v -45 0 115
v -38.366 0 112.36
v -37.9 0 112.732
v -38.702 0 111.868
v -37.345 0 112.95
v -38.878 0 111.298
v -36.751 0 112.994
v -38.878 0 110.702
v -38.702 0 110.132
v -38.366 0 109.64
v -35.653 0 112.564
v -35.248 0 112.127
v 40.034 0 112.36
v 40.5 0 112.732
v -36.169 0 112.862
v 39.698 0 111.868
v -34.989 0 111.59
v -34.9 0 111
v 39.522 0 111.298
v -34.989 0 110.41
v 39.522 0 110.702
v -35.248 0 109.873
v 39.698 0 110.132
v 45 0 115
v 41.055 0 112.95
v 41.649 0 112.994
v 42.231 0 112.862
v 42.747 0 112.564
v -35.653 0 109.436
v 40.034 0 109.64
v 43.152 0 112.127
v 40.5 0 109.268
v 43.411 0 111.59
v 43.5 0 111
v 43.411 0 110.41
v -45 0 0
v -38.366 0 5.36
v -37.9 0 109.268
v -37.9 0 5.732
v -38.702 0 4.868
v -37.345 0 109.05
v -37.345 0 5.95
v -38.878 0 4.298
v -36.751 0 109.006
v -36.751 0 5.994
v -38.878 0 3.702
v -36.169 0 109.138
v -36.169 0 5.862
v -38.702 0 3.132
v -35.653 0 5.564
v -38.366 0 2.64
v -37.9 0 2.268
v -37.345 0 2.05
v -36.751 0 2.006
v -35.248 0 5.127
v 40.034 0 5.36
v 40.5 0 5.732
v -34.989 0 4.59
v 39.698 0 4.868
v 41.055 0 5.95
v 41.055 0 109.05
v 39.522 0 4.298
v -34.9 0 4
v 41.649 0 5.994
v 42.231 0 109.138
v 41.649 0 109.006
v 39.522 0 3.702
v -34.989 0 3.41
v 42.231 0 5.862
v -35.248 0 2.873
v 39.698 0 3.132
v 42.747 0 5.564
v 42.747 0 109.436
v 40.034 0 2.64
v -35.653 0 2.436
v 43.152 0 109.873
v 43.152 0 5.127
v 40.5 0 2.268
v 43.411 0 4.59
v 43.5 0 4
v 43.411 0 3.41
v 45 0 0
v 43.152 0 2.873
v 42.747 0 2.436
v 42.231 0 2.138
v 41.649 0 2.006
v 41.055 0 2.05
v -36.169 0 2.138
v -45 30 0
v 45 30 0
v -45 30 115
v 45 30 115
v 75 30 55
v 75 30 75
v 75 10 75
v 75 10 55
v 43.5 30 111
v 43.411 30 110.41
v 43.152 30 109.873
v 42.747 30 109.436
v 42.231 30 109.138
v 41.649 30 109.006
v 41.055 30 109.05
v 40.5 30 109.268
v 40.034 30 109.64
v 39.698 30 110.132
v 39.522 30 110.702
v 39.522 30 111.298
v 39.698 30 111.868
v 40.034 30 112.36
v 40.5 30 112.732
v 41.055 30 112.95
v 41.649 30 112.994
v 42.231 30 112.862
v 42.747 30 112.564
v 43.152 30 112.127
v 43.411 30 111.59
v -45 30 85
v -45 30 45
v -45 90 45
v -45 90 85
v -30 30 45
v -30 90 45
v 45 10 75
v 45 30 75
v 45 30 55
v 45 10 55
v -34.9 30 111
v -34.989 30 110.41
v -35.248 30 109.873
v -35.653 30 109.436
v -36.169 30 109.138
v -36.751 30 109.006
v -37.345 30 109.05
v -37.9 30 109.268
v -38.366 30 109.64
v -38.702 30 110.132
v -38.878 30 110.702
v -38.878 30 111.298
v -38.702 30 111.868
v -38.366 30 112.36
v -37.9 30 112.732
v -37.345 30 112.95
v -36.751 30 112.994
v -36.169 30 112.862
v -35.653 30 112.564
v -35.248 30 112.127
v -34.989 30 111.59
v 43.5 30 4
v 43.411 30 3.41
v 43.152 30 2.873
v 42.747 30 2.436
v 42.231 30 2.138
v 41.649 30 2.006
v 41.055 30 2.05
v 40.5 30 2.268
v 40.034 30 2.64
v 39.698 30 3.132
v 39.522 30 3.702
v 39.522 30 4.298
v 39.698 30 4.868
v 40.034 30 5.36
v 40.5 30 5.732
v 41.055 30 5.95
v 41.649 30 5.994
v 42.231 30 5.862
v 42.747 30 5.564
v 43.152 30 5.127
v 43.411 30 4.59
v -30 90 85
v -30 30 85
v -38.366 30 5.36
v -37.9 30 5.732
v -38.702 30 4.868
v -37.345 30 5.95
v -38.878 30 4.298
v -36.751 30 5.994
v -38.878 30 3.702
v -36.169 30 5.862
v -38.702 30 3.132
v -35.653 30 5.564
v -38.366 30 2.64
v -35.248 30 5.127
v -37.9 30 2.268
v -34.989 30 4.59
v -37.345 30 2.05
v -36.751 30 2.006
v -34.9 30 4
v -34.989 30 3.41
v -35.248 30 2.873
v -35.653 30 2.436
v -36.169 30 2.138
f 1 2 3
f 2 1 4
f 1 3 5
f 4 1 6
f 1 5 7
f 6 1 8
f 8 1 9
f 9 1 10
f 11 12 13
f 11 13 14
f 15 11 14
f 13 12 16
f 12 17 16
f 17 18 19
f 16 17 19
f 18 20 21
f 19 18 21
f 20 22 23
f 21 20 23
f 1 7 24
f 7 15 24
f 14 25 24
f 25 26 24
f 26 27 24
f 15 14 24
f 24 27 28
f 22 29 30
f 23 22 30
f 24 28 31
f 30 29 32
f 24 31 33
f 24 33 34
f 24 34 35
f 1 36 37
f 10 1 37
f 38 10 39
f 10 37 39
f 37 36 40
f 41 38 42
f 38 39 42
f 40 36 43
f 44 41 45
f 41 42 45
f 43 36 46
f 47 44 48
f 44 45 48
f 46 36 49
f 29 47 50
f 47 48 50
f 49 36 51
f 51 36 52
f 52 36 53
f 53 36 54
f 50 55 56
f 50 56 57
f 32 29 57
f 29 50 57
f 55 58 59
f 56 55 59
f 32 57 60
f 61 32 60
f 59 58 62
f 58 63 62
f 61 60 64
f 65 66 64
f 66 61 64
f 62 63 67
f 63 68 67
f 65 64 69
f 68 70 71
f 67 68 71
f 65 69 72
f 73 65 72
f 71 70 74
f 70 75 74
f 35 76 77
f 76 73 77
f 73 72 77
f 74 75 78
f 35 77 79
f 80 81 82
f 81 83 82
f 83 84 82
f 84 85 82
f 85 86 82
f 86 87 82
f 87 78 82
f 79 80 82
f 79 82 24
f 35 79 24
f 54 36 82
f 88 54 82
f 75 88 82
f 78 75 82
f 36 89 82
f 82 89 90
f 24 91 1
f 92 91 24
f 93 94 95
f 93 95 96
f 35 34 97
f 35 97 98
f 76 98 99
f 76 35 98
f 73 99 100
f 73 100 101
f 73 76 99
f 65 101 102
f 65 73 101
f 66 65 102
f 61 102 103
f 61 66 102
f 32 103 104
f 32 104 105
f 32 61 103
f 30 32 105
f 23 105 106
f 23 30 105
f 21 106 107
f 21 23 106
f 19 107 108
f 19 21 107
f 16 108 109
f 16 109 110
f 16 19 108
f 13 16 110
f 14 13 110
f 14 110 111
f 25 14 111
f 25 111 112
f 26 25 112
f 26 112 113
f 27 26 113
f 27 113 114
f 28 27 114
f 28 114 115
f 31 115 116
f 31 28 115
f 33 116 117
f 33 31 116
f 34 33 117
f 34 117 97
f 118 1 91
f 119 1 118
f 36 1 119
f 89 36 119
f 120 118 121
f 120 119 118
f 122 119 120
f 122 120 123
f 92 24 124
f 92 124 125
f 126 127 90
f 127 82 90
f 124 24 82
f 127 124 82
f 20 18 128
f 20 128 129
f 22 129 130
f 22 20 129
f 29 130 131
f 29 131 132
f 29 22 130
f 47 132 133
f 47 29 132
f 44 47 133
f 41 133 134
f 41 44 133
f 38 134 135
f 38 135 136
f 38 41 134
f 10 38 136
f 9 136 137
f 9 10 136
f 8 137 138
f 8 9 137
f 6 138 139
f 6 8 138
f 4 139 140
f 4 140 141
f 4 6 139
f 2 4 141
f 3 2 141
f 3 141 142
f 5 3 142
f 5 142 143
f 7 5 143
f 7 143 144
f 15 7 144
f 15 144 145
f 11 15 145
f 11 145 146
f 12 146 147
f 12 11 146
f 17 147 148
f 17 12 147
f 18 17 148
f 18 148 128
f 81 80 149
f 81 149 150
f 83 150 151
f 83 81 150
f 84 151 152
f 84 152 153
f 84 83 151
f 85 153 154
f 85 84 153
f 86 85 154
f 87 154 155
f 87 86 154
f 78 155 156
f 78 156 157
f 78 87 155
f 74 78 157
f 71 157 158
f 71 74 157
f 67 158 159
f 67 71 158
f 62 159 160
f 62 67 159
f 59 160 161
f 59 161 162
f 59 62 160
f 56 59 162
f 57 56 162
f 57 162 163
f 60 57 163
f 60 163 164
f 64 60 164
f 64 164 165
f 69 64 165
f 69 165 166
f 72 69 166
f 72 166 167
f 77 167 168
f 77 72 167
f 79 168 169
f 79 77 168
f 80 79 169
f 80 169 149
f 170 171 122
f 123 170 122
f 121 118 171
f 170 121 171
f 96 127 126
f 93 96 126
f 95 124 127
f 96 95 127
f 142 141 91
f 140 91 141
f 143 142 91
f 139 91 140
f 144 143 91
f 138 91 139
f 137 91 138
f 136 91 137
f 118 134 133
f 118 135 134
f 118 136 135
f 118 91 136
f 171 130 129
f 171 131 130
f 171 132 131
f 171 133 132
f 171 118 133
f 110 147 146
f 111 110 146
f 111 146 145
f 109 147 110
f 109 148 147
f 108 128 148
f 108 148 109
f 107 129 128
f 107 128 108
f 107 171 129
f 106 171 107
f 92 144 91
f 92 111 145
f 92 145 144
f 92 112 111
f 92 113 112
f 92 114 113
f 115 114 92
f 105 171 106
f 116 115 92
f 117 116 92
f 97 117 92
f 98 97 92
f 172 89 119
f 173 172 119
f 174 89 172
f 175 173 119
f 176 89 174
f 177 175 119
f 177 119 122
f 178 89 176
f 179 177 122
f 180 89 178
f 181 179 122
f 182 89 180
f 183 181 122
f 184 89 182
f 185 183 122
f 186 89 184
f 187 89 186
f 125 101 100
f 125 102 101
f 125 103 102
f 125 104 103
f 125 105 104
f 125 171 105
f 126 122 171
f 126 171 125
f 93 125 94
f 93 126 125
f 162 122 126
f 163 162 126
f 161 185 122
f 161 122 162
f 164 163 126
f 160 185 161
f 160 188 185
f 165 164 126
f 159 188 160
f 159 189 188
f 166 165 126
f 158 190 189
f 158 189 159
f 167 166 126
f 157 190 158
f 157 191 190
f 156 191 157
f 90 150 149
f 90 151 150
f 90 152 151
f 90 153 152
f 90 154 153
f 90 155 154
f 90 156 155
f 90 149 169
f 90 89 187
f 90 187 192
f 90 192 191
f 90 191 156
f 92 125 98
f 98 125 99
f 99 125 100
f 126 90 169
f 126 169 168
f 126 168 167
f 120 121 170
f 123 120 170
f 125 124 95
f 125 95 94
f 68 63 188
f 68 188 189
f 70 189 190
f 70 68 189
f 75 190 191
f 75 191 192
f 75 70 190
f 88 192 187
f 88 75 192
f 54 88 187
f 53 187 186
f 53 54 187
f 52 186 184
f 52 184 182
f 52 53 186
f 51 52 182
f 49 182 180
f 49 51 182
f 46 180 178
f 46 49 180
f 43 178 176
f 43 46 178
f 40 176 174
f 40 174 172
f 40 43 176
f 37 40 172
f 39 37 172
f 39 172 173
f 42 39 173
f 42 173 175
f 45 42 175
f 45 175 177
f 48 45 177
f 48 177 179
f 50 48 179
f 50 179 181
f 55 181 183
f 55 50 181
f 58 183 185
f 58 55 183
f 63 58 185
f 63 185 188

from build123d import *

# Parameters (mm, degrees)
SKETCH_1_W              = 90
SKETCH_1_H              = 30
EXTRUDE_1_DEPTH         = 115
SKETCH_3_W              = 20
SKETCH_3_H              = 20
EXTRUDE_2_DEPTH         = 30
SKETCH_4_W              = 15
SKETCH_4_H              = 40
EXTRUDE_3_DEPTH         = 60
CUT_EXTRUDE_1_OUTLINE_R = 2
CUT_EXTRUDE_1_DEPTH     = 30


# Read off the part's stored shape, not the designer's step: 切除-拉伸1
with BuildPart() as part:
    # 草图1 → 凸台-拉伸1 (new body)
    with BuildSketch(Plane.XY):
        with Locations((0, 15)):
            Rectangle(SKETCH_1_W, SKETCH_1_H)
    extrude(amount=EXTRUDE_1_DEPTH)

    # 草图3 → 凸台-拉伸2 (add)
    with BuildSketch(Plane(origin=(45, 0, 0), x_dir=(0, 0, -1), z_dir=(1, 0, 0))):
        with Locations((-65, 20)):
            Rectangle(SKETCH_3_W, SKETCH_3_H)
    extrude(amount=EXTRUDE_2_DEPTH)

    # 草图4 → 凸台-拉伸3 (add)
    with BuildSketch(Plane(origin=(0, 30, 0), x_dir=(1, 0, 0), z_dir=(0, 1, 0))):
        with Locations((-37.5, -65)):
            Rectangle(SKETCH_4_W, SKETCH_4_H)
    extrude(amount=EXTRUDE_3_DEPTH)

    # 切除-拉伸1 outline → 切除-拉伸1 (cut)
    with BuildSketch(Plane(origin=(0, 0, 0), x_dir=(1, 0, 0), z_dir=(0, 1, 0))):
        with Locations((41.5, -4)):
            Circle(CUT_EXTRUDE_1_OUTLINE_R)
        with Locations((-36.9, -4)):
            Circle(CUT_EXTRUDE_1_OUTLINE_R)
        with Locations((-36.9, -111)):
            Circle(CUT_EXTRUDE_1_OUTLINE_R)
        with Locations((41.5, -111)):
            Circle(CUT_EXTRUDE_1_OUTLINE_R)
    extrude(amount=CUT_EXTRUDE_1_DEPTH, mode=Mode.SUBTRACT)


solid = part.part
